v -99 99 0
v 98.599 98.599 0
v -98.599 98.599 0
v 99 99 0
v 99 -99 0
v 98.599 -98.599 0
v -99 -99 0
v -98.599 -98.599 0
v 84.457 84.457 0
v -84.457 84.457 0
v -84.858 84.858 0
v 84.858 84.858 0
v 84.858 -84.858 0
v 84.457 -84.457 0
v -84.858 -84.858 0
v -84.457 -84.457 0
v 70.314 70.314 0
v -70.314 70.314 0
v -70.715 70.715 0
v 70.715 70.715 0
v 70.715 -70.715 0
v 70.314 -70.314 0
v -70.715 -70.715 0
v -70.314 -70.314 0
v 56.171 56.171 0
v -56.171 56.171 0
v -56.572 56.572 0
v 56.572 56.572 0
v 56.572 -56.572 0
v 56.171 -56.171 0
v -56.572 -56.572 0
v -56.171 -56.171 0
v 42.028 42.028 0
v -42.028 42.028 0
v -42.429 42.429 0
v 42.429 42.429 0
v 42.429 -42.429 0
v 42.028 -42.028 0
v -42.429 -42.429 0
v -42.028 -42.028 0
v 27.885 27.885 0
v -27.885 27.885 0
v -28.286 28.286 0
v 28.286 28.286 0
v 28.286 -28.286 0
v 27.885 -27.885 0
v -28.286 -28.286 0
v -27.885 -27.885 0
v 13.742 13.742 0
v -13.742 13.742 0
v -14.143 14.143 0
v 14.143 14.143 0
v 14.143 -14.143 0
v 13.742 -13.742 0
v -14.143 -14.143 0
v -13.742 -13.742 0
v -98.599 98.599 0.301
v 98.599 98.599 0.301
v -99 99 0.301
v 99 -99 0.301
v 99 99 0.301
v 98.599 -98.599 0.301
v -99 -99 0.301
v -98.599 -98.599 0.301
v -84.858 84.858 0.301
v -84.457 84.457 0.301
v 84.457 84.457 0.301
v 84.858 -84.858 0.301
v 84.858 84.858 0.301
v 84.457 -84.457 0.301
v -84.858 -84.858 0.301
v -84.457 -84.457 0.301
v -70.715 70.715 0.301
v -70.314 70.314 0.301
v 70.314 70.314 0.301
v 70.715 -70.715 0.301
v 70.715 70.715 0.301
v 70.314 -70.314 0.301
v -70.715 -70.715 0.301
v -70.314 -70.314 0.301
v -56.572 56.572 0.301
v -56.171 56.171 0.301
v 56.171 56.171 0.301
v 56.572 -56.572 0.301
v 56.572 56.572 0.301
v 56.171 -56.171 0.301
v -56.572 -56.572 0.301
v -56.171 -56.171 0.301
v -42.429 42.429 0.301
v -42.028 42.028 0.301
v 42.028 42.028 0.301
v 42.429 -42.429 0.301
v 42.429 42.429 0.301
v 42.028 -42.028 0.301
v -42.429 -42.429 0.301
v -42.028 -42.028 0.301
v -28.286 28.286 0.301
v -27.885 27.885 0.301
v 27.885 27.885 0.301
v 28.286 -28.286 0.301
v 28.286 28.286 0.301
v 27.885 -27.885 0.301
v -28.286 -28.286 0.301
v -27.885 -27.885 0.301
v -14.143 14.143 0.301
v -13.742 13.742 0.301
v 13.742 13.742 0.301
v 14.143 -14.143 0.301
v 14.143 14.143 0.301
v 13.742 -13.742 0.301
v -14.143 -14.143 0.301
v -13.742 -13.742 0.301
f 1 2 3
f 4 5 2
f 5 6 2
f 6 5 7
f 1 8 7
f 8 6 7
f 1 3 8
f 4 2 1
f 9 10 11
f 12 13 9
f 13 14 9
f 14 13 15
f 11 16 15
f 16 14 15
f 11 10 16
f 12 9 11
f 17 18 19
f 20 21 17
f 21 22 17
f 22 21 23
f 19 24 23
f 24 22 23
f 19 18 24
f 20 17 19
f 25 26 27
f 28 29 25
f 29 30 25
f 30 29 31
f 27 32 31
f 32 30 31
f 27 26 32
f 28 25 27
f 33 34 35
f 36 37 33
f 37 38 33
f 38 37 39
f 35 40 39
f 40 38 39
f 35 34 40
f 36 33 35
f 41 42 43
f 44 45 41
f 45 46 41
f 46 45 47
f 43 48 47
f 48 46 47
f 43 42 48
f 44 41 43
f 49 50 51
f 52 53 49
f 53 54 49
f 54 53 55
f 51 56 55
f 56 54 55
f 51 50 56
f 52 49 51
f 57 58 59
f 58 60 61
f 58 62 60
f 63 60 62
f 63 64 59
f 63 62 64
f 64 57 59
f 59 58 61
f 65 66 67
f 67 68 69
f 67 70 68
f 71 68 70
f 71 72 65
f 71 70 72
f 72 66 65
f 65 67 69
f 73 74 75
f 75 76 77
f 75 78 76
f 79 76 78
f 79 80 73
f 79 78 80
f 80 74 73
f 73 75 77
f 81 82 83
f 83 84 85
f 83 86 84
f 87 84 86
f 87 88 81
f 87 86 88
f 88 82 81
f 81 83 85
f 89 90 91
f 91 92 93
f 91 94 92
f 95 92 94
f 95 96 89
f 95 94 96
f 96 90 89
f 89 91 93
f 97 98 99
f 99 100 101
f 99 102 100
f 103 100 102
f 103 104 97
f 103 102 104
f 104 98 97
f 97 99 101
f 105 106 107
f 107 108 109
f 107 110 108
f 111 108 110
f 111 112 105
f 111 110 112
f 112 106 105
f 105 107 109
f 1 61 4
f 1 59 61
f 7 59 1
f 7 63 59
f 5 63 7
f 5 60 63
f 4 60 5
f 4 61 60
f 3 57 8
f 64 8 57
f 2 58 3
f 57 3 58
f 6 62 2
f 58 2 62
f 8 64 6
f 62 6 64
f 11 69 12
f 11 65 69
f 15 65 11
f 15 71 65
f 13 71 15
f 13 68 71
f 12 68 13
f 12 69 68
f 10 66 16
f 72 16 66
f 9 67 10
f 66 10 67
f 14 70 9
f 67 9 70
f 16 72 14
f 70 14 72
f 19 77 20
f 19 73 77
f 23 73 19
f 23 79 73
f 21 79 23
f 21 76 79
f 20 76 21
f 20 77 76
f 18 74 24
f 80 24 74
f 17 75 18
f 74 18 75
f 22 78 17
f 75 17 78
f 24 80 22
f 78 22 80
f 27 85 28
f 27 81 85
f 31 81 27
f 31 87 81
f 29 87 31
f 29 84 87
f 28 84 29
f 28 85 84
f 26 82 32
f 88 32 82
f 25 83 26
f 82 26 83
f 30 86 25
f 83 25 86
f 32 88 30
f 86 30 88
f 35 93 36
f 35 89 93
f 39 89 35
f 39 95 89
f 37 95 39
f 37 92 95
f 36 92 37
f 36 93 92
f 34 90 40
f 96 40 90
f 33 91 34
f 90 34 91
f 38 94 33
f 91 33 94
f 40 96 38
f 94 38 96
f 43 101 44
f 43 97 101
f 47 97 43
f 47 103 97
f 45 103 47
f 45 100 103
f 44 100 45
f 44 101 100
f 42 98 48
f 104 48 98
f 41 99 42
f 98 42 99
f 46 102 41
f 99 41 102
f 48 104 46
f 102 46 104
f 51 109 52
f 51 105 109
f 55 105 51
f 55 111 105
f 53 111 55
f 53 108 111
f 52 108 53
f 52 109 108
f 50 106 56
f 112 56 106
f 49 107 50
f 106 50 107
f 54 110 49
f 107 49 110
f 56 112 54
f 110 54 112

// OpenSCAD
// examples/blp_showcase_example.scad

include <../src/bedlevelpattern.scad>;

/* [Pattern Selection] */

// List of available patterns:
// 0: "concentric squares"
// 1: "spiral squares"
// 2: "concentric circles"
// 3: "x in square"
// 4: "circle in square"
// 5: "grid"
// 6: "padded grid"
// 7: "five circles"

// Select the pattern type by setting this variable:
// You can use either a string or a number (0-7)
selected_pattern_type = 0; // Change this to any number from 0 to 7 or the pattern name as a string
//selected_pattern_type = "concentric squares"; 

/* [Common Parameters] */

print_area_width = 220.001;
print_area_depth = 220.001;
line_width = 0.401;
line_height = 0.301;
fill_percentage = 90; // Range: [50:100]
quality_value = 128;

$fn = quality_value;

/* [Pattern Mapping] */

// Mapping of numbers to pattern names
pattern_names = [
    "concentric squares", // 0
    "spiral squares",     // 1
    "concentric circles", // 2
    "x in square",        // 3
    "circle in square",   // 4
    "grid",               // 5
    "padded grid",        // 6
    "five circles"        // 7
];

/* [Determine the Pattern Name] */

// If selected_pattern_type is a number between 0 and 7, map it to the pattern name
// Else, assume it's a string and use it directly
bed_level_pattern_type =
    is_num(selected_pattern_type)
        ? pattern_names[(selected_pattern_type >= 0 && selected_pattern_type <= 7) ? selected_pattern_type : 0]
        : selected_pattern_type;

/* [Pattern-Specific Parameters Initialization] */

// Initialize pattern-specific parameters with default values
concentric_ring_count = 7;
grid_cell_count = 4;
grid_pad_size = 10.001;
circle_diameter = 20;
outline_distance = 5;

/* [Pattern-Specific Parameters Configuration] */

// Adjust pattern-specific parameters based on the selected pattern
if (bed_level_pattern_type == "concentric squares" || bed_level_pattern_type == "spiral squares" ||
    bed_level_pattern_type == "concentric circles")
{
    // These patterns use concentric_ring_count
    concentric_ring_count = 7; // Adjust this value if needed
}

if (bed_level_pattern_type == "grid" || bed_level_pattern_type == "padded grid")
{
    // These patterns use grid_cell_count
    grid_cell_count = 4; // Adjust this value if needed
}

if (bed_level_pattern_type == "padded grid")
{
    // Padded grid uses grid_pad_size
    grid_pad_size = 10.001; // Adjust this value if needed
}

if (bed_level_pattern_type == "five circles")
{
    // Five circles pattern uses circle_diameter and outline_distance
    circle_diameter = 20; // Adjust this value if needed
    outline_distance = 5; // Adjust this value if needed
}

/* [Generate the Pattern] */

generate_bed_level_pattern(bed_level_pattern_type = bed_level_pattern_type, print_area_width = print_area_width,
                           print_area_depth = print_area_depth, line_width = line_width, line_height = line_height,
                           fill_percentage = fill_percentage,
                           // Pass pattern-specific parameters
                           concentric_ring_count = concentric_ring_count, grid_cell_count = grid_cell_count,
                           grid_pad_size = grid_pad_size, circle_diameter = circle_diameter,
                           outline_distance = outline_distance);
